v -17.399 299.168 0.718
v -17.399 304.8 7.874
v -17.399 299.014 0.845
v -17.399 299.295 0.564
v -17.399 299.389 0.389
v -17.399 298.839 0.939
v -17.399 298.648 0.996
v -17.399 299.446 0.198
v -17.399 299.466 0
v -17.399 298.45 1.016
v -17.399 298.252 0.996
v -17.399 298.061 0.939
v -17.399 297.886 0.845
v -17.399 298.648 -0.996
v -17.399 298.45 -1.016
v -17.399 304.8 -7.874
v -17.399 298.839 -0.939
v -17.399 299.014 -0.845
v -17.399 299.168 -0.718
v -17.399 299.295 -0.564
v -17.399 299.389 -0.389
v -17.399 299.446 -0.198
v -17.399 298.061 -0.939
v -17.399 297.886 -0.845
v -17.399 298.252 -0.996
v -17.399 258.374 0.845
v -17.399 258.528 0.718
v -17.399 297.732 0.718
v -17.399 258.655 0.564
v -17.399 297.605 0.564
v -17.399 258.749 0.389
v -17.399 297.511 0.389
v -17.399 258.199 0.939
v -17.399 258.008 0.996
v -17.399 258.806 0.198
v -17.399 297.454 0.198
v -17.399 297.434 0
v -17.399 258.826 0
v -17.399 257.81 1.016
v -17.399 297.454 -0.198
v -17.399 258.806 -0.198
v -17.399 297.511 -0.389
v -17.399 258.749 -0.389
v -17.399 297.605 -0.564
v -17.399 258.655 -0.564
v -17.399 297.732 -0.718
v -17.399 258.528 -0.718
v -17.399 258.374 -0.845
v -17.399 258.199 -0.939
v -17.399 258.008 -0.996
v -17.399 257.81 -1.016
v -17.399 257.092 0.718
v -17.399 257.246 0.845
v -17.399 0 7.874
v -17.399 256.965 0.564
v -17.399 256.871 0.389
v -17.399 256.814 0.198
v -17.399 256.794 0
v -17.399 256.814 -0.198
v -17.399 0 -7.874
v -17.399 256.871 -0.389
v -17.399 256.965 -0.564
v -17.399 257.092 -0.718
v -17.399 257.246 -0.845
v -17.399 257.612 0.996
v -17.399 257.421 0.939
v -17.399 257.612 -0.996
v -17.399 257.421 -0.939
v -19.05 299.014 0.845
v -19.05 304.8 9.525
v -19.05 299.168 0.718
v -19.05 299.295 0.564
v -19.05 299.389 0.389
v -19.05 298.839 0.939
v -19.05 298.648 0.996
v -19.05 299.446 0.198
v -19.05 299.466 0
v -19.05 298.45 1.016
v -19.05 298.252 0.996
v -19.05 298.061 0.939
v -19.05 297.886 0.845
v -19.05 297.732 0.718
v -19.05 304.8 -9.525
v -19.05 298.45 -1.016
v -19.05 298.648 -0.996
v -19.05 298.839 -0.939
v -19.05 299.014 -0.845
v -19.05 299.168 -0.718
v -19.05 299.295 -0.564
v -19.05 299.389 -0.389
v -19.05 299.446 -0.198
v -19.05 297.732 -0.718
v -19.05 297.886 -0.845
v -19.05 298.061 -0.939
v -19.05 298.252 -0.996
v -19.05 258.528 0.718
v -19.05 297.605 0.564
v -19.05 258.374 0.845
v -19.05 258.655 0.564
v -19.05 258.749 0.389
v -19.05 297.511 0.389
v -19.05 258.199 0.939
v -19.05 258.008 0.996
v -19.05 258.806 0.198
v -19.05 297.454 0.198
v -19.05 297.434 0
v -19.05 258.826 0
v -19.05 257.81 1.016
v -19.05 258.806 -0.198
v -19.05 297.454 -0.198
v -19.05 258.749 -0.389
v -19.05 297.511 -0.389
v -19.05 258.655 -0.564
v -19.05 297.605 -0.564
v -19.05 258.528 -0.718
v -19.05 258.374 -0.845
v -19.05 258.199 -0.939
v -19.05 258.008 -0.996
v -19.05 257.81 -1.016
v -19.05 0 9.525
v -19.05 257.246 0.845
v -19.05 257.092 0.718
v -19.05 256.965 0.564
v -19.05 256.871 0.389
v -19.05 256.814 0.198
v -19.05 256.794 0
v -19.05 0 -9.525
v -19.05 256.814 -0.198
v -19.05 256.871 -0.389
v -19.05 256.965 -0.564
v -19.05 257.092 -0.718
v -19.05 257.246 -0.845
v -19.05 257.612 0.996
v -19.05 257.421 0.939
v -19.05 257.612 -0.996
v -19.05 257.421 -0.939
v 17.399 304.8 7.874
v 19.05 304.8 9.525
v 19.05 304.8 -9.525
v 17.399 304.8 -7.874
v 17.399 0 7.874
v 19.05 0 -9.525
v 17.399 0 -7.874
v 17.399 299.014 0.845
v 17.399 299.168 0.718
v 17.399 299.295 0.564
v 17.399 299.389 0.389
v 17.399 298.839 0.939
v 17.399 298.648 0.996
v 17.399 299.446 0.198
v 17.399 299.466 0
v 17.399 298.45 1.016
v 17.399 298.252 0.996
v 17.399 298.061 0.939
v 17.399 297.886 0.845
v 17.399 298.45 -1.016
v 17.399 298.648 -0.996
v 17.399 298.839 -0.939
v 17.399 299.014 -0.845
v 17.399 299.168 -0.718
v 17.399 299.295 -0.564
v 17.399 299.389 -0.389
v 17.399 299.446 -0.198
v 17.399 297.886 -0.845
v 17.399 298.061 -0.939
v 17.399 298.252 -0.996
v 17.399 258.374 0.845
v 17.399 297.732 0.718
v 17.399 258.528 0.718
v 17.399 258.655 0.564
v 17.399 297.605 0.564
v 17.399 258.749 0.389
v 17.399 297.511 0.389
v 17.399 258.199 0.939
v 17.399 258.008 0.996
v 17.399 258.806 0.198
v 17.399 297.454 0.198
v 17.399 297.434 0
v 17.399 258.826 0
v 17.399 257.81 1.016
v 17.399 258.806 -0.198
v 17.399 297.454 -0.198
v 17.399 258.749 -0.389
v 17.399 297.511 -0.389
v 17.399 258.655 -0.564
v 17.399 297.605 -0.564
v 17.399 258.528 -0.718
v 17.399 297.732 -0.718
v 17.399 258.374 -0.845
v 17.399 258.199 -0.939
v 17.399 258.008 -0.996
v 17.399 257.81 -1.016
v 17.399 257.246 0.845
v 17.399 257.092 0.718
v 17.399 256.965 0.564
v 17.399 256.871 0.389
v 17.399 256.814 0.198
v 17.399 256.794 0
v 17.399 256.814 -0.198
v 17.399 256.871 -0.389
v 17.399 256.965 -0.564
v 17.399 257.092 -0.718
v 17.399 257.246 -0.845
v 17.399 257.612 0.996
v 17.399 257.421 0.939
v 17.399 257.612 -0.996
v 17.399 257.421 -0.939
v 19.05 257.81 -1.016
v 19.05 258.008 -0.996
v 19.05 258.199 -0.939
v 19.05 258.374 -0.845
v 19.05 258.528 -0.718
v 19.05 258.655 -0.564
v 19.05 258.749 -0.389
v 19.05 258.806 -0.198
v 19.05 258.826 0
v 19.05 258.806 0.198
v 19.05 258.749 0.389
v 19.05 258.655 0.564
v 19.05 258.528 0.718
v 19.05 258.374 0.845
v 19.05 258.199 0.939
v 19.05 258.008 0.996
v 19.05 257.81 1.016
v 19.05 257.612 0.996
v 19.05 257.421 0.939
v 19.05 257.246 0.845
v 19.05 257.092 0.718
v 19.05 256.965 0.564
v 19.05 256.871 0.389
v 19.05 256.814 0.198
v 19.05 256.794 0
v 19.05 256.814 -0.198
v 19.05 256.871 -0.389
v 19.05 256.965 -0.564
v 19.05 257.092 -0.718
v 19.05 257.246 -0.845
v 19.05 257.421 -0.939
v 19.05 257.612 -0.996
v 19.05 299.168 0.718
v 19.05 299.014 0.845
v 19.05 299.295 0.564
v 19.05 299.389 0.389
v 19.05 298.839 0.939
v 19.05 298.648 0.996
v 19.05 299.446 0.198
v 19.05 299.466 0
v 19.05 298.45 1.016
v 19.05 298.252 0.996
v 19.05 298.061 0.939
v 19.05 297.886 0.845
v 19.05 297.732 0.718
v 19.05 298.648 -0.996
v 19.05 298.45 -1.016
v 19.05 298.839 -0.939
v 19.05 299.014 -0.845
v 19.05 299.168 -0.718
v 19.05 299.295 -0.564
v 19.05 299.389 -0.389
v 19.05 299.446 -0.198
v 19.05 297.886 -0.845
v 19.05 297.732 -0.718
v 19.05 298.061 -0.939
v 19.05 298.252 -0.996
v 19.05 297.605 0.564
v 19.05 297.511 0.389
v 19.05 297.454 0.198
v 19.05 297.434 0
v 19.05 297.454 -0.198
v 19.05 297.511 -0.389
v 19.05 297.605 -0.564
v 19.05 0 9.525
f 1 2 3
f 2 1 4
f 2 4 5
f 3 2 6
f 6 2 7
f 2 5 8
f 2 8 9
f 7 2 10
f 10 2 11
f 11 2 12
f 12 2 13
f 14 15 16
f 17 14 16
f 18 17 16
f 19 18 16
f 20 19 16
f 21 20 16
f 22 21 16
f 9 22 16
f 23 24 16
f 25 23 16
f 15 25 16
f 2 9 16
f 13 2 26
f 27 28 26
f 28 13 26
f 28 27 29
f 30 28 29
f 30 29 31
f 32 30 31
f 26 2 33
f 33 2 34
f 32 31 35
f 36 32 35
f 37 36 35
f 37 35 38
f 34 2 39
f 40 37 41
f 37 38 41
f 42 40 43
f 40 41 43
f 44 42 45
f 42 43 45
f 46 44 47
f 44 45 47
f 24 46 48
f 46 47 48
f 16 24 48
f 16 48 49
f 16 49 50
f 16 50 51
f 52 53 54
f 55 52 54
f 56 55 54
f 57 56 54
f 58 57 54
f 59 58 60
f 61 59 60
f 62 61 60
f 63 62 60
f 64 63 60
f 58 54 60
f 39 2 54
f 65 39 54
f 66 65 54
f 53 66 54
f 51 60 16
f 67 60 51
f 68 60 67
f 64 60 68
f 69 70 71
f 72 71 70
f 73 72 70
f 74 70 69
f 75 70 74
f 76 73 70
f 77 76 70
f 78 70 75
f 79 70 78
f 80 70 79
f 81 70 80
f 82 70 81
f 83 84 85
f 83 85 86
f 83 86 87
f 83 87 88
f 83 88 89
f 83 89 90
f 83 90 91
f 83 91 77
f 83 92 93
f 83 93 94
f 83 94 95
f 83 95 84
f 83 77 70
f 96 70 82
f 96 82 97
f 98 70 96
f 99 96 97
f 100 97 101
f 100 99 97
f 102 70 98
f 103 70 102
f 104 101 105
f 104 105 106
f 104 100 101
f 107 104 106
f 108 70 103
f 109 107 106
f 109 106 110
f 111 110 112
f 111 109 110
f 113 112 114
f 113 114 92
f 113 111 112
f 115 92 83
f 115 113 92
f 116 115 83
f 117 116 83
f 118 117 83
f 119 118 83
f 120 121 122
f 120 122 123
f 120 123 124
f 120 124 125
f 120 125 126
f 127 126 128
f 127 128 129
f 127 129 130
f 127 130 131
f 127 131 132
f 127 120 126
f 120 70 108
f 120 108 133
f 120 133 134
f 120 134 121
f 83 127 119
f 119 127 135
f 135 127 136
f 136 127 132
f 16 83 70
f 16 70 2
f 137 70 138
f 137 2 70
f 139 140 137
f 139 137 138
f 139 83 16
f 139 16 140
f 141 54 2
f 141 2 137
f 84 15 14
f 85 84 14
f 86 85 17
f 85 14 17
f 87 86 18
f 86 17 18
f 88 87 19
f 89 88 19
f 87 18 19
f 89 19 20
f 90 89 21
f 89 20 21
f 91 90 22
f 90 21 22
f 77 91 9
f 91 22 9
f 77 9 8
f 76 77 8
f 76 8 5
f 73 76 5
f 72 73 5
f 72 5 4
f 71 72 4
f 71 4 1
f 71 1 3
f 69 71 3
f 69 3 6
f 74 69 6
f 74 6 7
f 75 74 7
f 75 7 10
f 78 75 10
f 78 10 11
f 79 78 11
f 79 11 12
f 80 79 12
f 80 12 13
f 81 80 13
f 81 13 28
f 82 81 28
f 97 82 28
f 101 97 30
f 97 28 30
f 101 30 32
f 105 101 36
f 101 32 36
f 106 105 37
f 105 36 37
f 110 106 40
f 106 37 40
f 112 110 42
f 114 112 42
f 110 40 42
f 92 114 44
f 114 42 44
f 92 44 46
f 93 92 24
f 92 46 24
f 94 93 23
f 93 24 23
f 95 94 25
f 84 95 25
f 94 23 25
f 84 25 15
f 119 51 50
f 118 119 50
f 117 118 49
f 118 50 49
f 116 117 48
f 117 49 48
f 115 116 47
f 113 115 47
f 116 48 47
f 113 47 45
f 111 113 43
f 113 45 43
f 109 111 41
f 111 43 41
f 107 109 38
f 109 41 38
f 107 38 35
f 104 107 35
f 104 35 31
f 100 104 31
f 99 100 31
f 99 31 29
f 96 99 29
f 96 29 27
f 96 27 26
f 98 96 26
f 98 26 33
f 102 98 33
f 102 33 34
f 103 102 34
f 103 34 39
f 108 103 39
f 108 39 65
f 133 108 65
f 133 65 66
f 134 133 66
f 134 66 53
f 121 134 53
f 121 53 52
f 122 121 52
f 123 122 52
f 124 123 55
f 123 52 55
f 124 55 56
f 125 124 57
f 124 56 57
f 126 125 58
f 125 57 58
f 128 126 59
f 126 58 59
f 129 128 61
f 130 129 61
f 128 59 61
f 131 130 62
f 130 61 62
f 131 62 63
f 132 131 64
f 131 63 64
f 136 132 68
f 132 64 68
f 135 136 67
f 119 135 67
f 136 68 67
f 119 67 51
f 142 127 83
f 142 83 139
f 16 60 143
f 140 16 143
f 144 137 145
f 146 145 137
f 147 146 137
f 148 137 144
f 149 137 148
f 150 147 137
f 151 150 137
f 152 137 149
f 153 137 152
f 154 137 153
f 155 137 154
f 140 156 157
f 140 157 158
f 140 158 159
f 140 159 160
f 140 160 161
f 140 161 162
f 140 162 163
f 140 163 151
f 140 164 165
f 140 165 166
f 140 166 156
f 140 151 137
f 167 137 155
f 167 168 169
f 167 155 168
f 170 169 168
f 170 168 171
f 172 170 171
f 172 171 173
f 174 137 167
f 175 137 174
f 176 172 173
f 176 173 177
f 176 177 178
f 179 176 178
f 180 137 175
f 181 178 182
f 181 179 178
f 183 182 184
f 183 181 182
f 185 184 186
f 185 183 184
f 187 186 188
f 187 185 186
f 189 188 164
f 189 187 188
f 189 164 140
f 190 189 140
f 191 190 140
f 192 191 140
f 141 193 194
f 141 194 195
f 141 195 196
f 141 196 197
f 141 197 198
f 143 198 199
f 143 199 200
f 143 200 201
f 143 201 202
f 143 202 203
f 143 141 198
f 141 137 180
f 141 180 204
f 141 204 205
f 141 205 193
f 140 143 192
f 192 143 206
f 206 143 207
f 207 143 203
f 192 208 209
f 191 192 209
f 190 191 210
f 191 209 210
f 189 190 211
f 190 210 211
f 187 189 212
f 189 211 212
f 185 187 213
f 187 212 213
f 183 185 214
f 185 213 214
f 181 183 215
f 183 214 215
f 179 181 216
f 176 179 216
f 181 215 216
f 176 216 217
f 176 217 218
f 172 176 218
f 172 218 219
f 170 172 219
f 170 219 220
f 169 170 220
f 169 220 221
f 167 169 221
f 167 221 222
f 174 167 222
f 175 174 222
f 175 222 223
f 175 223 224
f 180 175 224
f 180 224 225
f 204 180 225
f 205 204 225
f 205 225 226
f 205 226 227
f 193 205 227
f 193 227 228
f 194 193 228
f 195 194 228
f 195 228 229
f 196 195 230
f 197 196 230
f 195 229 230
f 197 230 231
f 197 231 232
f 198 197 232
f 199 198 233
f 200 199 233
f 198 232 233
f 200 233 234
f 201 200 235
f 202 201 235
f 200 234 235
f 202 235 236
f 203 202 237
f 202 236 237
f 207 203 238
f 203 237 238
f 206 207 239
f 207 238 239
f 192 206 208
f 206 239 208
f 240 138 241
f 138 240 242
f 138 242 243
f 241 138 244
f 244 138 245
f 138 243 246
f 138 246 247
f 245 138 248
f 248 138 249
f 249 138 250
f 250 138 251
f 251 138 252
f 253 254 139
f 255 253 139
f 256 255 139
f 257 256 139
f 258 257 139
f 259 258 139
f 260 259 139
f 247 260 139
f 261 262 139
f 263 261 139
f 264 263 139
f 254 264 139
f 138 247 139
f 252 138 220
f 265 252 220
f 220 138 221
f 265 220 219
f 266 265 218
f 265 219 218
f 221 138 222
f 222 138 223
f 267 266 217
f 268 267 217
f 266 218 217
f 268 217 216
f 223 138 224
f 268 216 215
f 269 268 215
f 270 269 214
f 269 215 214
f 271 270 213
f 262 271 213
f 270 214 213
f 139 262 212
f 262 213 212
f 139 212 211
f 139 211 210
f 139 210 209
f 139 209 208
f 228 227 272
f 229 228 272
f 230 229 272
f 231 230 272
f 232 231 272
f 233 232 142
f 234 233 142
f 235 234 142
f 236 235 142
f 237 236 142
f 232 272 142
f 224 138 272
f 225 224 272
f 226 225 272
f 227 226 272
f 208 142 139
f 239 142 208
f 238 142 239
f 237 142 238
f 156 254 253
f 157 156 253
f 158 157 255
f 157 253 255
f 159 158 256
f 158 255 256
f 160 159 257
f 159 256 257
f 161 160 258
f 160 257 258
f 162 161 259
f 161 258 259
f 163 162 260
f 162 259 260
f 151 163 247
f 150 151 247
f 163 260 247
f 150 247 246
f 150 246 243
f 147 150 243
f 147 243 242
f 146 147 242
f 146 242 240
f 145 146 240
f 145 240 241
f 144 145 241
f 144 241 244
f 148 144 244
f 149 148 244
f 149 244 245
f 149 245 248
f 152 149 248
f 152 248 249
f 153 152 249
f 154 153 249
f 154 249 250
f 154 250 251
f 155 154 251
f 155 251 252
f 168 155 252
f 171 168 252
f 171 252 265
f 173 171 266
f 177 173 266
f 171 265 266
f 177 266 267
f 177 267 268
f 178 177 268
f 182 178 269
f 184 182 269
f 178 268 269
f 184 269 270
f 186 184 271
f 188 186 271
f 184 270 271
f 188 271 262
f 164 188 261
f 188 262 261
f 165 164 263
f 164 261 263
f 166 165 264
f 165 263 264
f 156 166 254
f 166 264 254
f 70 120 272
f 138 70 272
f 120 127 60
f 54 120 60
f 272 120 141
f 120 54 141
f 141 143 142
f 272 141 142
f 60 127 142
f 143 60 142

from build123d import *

# Parameters (mm, degrees)
SKETCH1_W           = 38.1
SKETCH1_H           = 19.05
SKETCH1_W_2         = 34.798
SKETCH1_H_2         = 15.748
BOSS_EXTRUDE1_DEPTH = 304.8
SKETCH2_R           = 1.016
CUT_EXTRUDE1_DEPTH  = 39.1


with BuildPart() as part:
    # Sketch1 → Boss-Extrude1 (new body)
    with BuildSketch(Plane(origin=(0, 0, 0), x_dir=(1, 0, 0), z_dir=(0, 1, 0))):
        Rectangle(SKETCH1_W, SKETCH1_H)
        Rectangle(SKETCH1_W_2, SKETCH1_H_2, mode=Mode.SUBTRACT)
    extrude(amount=BOSS_EXTRUDE1_DEPTH)

    # Sketch2 → Cut-Extrude1 (cut, through all)
    with BuildSketch(Plane(origin=(19.05, 0, 0), x_dir=(0, 0, -1), z_dir=(1, 0, 0))):
        with Locations((0, 298.45)):
            Circle(SKETCH2_R)
        with Locations((0, 257.81)):
            Circle(SKETCH2_R)
    extrude(amount=-CUT_EXTRUDE1_DEPTH, mode=Mode.SUBTRACT)


solid = part.part
